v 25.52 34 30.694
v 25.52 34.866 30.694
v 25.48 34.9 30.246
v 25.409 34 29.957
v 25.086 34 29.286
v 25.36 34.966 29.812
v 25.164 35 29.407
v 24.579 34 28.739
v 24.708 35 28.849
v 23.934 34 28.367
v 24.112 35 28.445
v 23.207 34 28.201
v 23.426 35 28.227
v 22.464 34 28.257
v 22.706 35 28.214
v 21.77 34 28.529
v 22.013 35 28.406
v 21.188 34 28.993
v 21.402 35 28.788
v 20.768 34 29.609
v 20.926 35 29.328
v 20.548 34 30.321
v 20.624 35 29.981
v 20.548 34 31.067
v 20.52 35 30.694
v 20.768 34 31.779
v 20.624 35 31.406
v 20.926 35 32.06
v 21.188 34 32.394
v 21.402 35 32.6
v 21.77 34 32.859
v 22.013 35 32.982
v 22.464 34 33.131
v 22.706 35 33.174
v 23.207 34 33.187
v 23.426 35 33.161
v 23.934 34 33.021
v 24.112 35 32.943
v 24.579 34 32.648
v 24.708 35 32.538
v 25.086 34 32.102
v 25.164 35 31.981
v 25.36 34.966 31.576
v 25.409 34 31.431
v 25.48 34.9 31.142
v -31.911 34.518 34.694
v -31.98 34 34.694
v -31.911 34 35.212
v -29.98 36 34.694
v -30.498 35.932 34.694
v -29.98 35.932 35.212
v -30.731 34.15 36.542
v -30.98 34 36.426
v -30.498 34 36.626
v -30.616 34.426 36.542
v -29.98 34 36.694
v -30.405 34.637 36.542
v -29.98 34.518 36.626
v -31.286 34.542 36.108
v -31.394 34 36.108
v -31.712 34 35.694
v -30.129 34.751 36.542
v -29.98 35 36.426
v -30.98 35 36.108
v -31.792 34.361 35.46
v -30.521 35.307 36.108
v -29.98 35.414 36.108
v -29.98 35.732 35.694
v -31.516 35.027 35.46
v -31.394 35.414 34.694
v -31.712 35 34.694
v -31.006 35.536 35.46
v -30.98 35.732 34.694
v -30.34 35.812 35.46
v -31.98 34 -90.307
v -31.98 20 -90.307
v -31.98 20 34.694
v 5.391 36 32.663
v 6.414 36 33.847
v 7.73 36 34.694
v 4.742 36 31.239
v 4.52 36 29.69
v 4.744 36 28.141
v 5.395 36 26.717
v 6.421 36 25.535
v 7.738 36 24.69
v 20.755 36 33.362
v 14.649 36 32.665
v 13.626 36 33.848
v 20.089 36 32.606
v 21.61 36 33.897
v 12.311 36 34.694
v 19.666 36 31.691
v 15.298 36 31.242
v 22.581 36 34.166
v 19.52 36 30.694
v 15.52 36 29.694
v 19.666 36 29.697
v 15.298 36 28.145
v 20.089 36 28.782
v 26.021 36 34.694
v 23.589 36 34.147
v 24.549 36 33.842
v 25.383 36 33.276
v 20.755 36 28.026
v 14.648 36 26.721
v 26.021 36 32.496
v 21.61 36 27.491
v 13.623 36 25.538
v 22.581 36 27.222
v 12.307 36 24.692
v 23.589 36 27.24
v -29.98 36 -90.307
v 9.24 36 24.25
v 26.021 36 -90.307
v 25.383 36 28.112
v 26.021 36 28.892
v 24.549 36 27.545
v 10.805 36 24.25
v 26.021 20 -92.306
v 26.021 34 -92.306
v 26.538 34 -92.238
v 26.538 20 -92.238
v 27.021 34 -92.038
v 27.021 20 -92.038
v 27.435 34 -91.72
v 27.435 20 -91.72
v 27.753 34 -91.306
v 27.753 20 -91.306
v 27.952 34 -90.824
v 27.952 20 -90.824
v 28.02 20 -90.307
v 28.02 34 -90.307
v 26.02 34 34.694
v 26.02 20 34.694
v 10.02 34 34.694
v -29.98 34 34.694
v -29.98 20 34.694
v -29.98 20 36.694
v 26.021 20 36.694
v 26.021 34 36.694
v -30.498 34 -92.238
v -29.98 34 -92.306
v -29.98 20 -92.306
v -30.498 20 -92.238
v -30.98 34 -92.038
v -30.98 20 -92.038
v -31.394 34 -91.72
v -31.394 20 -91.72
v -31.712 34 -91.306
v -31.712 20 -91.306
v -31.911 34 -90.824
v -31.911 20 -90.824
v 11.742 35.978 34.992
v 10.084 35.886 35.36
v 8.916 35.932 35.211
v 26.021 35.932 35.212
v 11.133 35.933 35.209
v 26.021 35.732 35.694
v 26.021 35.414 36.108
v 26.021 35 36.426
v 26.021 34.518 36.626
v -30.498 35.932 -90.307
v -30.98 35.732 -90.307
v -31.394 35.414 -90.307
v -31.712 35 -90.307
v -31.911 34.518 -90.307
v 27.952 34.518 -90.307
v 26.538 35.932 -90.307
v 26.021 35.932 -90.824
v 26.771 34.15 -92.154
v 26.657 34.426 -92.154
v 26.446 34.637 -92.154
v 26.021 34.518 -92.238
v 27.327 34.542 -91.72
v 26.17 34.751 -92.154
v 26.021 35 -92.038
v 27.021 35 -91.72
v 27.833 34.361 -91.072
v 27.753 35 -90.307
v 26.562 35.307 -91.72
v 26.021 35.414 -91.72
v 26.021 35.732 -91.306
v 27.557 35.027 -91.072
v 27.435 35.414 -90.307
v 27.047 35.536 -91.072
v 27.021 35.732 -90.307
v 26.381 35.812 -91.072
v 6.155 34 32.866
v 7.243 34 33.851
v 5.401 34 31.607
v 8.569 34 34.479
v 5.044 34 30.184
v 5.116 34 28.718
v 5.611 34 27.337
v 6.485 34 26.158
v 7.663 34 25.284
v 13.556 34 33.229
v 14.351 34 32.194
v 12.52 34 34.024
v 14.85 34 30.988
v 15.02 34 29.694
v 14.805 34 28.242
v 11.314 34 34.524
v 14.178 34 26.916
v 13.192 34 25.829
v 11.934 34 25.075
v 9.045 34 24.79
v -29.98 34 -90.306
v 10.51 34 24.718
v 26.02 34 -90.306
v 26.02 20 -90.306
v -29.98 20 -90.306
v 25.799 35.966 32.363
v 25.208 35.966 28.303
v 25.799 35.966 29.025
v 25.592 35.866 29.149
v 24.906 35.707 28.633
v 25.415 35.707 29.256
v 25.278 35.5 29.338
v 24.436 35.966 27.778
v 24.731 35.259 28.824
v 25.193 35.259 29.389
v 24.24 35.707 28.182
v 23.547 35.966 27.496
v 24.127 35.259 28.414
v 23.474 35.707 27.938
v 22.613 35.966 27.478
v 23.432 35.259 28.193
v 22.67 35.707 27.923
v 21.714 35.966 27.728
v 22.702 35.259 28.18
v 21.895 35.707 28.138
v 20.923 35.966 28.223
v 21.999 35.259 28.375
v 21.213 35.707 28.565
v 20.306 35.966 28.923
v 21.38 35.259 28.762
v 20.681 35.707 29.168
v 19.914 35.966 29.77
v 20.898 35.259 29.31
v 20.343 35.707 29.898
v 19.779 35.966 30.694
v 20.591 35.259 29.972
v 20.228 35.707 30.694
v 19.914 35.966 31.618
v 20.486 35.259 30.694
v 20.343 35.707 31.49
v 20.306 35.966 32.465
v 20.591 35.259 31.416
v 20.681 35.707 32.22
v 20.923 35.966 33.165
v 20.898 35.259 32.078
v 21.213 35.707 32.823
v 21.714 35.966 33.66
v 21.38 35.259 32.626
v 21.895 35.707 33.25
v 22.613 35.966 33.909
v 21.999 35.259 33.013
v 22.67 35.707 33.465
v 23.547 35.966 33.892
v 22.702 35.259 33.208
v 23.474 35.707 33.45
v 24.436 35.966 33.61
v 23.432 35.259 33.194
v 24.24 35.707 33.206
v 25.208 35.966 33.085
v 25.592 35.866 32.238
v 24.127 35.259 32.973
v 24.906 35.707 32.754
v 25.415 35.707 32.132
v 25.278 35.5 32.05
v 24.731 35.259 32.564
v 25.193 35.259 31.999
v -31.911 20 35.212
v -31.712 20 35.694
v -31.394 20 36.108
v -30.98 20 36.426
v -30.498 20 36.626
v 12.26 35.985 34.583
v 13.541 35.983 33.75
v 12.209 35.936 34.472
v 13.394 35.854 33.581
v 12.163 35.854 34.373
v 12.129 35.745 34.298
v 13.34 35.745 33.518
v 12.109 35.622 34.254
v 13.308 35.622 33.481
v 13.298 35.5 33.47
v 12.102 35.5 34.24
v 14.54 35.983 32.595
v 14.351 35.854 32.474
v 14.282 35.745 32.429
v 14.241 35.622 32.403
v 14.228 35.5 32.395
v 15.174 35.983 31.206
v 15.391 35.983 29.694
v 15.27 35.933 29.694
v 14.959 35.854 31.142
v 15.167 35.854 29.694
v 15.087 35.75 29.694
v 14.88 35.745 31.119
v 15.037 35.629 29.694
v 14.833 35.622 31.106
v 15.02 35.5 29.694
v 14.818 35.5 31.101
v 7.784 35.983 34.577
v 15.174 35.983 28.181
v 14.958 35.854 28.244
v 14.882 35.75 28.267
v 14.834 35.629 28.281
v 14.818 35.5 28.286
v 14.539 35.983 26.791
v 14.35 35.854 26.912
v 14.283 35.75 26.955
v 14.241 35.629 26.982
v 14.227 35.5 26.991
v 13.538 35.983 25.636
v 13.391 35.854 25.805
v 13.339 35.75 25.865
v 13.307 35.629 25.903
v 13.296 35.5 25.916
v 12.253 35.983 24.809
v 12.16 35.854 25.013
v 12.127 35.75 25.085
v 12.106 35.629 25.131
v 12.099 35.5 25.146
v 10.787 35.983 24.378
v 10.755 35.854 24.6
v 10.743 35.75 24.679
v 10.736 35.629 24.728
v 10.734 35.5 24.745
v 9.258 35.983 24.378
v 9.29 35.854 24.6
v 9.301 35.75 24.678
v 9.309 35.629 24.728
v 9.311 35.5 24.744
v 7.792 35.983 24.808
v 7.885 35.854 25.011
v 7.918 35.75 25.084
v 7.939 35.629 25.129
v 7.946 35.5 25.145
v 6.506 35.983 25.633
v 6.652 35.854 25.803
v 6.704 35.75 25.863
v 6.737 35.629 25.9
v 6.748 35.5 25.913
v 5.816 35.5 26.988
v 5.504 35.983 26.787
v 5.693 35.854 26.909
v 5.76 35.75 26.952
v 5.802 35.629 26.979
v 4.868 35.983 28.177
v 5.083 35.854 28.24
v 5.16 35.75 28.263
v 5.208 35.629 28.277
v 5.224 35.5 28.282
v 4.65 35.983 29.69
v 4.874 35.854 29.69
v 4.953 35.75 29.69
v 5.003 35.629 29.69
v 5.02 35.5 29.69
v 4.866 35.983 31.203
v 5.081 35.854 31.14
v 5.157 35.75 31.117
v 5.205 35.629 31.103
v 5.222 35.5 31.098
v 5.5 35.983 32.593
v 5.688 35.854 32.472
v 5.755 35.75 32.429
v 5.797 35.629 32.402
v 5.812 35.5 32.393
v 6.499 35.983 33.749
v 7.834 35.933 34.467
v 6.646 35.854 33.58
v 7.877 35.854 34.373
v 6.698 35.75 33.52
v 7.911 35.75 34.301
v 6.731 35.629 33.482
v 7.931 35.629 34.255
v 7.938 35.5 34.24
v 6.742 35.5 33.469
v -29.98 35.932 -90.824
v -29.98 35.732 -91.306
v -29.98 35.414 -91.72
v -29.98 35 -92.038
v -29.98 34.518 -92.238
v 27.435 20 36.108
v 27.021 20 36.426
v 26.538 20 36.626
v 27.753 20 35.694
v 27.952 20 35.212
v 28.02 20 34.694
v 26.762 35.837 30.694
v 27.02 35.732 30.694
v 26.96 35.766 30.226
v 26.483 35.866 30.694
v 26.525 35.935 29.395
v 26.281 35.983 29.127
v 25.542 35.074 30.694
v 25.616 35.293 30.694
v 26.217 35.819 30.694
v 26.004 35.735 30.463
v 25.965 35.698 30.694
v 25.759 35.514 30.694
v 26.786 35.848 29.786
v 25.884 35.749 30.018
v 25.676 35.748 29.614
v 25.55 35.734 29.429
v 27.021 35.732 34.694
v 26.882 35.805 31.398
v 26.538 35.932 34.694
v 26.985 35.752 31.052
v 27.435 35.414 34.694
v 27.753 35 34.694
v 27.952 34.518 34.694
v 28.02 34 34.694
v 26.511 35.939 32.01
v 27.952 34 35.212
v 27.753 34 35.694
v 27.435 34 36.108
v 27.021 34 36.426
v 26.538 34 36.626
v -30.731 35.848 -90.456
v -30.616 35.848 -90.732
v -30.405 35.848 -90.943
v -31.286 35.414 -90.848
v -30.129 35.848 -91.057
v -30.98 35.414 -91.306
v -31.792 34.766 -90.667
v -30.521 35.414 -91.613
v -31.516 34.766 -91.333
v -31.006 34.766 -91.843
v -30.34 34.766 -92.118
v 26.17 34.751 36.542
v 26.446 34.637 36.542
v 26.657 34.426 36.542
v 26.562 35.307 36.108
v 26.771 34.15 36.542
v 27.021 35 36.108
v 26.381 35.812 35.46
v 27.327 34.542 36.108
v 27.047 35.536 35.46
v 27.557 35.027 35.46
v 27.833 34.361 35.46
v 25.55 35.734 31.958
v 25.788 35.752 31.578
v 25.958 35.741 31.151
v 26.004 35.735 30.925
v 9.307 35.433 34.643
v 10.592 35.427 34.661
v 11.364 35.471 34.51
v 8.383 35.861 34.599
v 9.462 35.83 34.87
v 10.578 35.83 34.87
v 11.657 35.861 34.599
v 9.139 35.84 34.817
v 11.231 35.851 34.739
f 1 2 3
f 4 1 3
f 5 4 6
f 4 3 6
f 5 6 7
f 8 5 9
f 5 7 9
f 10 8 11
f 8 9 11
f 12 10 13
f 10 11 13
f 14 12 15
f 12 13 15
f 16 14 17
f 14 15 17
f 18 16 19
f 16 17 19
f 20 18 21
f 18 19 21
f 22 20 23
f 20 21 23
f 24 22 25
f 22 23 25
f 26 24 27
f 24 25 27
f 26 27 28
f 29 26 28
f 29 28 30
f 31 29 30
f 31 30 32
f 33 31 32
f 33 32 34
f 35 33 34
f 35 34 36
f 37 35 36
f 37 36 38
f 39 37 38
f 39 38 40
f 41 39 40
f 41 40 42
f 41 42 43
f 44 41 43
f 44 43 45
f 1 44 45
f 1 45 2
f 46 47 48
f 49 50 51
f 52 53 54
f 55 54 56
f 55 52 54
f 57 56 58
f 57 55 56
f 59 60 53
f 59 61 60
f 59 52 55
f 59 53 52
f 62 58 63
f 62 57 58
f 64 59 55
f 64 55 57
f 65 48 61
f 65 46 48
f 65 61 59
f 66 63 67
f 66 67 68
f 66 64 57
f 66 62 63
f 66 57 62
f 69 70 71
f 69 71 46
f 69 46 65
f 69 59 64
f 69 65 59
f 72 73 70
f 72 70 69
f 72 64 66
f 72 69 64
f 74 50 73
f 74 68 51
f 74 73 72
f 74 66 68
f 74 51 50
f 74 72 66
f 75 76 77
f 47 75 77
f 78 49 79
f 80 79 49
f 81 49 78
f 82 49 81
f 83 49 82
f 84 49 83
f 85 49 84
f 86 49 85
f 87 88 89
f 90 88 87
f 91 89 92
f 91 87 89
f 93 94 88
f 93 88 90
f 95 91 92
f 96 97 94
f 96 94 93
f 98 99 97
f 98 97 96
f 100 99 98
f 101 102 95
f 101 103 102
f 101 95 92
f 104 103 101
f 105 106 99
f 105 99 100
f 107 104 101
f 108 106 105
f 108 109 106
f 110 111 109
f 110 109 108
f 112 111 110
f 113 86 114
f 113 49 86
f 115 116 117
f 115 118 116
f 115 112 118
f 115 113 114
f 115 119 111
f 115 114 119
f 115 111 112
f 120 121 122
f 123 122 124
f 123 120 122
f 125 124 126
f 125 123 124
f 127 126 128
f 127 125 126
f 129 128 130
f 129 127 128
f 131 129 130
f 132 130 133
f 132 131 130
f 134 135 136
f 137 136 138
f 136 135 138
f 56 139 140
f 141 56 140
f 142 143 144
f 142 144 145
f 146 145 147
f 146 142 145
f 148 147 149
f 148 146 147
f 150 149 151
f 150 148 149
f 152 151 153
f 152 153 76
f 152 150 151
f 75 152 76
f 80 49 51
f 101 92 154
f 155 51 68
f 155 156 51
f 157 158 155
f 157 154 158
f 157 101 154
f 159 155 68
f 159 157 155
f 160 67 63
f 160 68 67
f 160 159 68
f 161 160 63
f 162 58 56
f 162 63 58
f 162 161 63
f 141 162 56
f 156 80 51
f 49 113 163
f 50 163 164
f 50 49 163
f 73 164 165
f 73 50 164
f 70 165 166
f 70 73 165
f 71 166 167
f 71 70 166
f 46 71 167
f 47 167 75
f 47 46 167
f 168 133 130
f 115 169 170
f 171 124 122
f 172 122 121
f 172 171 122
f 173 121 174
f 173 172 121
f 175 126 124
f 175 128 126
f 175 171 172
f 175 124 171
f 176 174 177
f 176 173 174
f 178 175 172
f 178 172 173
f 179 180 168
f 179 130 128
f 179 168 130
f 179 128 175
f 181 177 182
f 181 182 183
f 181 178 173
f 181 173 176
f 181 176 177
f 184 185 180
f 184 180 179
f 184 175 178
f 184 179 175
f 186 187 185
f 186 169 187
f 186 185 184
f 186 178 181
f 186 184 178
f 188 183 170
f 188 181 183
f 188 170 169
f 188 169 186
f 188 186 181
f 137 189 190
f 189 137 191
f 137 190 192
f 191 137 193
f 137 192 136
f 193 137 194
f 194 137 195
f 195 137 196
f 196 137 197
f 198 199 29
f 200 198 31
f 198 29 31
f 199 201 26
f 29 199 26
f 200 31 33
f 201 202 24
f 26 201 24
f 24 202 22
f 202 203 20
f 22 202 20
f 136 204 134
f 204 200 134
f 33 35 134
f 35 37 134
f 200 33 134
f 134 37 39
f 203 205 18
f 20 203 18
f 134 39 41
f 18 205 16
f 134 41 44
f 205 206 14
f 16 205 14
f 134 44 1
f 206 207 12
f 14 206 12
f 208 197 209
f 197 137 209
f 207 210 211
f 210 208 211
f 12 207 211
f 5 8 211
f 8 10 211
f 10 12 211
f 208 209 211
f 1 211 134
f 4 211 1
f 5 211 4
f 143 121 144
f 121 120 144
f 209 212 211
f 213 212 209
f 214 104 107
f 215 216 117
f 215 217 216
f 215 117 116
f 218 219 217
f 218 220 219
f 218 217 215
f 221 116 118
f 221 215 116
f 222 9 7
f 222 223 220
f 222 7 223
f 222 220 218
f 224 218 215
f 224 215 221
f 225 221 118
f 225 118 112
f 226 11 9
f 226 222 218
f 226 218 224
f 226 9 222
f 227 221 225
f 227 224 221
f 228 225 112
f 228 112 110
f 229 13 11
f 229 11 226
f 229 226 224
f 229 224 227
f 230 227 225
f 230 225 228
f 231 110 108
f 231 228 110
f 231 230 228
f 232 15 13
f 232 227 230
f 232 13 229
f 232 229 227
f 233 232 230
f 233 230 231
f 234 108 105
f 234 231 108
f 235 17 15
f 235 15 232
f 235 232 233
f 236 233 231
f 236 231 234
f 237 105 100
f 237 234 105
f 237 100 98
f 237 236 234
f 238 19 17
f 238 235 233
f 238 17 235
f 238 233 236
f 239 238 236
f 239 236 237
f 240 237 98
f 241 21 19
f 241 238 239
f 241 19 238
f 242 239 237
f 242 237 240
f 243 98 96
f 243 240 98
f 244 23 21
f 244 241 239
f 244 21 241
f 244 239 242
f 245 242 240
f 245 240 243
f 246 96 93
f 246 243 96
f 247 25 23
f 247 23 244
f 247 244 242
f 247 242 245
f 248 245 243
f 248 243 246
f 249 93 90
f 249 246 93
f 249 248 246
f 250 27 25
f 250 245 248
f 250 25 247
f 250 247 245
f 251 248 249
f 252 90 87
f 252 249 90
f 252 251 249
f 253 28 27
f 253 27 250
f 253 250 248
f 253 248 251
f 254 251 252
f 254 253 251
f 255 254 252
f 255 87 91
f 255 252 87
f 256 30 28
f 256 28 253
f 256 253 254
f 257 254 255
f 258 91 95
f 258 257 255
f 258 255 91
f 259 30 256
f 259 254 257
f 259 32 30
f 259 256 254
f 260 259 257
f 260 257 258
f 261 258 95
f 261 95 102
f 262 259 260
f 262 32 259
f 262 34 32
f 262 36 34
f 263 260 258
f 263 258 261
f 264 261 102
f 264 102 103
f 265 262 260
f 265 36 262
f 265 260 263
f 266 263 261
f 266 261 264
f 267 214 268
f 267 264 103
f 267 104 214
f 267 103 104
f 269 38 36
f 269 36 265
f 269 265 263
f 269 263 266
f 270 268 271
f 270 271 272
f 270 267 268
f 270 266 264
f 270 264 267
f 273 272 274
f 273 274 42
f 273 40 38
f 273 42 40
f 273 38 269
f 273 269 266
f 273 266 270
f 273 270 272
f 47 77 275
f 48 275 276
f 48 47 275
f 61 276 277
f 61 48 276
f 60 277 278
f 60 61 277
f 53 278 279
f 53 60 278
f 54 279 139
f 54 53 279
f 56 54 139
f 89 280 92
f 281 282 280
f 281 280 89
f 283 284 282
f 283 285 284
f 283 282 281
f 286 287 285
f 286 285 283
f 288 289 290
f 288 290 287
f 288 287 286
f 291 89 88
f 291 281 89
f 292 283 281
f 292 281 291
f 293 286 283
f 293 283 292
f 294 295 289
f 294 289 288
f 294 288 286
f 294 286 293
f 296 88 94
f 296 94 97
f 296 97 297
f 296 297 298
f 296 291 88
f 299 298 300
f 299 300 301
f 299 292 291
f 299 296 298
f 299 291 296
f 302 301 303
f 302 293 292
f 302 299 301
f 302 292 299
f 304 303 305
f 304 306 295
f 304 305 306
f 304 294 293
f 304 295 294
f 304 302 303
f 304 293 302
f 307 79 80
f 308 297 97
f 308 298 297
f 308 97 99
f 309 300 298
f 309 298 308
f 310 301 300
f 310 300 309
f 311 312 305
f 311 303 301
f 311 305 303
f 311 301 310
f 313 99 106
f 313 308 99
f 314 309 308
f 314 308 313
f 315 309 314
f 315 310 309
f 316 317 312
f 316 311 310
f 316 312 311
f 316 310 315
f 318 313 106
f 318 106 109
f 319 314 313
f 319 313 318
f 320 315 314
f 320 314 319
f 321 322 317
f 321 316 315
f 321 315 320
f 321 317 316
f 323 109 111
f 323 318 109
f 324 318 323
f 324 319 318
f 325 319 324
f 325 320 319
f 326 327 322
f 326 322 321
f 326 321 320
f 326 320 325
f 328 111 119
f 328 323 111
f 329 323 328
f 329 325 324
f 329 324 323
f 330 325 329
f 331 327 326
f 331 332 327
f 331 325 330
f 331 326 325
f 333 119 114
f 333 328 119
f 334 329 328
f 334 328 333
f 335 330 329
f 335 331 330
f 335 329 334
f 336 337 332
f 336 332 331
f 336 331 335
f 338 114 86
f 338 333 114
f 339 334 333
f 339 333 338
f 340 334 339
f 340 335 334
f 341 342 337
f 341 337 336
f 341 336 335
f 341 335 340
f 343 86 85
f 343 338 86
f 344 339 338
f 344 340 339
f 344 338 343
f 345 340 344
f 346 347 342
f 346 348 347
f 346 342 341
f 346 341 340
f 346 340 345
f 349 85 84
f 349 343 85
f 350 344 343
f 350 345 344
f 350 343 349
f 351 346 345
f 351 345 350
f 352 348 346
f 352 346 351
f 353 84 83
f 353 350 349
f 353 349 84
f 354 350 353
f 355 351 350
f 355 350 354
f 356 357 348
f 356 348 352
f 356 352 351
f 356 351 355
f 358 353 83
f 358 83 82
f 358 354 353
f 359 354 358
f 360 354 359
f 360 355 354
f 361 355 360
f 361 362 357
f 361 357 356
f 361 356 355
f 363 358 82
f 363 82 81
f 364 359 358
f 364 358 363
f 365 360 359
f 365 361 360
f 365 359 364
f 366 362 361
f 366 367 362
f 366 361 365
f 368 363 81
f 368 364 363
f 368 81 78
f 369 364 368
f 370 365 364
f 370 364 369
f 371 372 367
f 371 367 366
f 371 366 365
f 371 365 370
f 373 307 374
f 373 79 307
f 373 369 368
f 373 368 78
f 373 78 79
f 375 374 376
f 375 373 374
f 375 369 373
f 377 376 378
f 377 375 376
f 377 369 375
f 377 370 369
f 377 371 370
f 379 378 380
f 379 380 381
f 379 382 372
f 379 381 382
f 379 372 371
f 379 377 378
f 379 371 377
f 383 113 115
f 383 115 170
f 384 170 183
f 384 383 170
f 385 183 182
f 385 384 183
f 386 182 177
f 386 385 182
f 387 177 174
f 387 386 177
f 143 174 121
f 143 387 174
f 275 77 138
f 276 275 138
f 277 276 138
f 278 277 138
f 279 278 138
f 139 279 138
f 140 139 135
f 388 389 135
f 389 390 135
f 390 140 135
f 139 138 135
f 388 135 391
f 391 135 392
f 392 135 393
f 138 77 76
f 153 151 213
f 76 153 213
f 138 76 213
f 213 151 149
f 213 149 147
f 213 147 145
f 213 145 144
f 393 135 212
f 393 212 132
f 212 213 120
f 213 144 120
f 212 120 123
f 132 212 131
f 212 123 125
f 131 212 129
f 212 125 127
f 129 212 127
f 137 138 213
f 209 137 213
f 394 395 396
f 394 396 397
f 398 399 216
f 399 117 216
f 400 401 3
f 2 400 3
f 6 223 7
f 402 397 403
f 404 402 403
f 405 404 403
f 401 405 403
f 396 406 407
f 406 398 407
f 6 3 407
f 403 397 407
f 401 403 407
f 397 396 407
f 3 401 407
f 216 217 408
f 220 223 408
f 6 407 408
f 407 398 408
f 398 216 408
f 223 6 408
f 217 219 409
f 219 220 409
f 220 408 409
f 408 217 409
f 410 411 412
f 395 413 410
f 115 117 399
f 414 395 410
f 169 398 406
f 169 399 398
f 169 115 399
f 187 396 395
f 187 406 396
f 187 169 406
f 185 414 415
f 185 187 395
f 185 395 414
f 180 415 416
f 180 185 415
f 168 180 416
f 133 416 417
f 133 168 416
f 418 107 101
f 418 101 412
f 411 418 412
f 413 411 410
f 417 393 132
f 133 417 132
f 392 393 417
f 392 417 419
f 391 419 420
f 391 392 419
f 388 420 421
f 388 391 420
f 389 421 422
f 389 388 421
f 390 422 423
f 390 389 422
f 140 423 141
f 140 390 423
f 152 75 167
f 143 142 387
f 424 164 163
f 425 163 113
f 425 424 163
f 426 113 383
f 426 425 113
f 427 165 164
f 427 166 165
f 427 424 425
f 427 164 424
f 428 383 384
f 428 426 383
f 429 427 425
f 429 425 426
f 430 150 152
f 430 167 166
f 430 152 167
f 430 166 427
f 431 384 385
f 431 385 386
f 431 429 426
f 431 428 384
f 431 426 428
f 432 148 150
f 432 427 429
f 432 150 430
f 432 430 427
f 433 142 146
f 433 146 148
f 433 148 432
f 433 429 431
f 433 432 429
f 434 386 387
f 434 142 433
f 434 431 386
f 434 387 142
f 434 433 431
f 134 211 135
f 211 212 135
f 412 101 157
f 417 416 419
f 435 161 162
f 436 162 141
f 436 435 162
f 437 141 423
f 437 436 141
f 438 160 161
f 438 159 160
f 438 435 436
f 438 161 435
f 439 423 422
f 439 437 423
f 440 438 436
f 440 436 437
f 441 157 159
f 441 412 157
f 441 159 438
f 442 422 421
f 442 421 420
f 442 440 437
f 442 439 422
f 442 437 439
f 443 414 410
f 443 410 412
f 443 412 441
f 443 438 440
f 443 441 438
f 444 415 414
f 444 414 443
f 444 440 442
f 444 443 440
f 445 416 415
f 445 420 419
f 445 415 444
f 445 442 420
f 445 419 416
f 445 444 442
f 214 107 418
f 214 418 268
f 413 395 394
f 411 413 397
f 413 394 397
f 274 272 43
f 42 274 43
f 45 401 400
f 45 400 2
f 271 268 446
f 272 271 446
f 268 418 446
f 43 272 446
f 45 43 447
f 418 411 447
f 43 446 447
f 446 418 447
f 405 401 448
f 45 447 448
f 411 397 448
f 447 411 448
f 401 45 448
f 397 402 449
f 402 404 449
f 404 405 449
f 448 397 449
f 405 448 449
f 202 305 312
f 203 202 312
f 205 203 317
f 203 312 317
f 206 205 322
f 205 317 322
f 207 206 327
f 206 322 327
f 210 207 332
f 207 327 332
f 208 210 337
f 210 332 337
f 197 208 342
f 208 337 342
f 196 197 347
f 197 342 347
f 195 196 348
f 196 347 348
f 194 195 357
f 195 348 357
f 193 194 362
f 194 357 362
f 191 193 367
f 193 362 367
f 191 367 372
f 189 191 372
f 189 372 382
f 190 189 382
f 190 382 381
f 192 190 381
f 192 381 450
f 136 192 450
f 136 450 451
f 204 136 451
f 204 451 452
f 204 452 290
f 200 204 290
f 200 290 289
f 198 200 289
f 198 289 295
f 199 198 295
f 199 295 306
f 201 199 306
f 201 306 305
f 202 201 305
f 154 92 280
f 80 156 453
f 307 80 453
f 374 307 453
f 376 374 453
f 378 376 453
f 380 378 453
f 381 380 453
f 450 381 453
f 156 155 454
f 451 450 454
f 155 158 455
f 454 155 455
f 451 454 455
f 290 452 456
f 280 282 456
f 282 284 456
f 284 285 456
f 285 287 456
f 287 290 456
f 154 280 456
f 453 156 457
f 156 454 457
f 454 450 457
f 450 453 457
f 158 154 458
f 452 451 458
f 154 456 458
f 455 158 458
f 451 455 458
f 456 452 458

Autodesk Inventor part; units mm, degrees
ref_plane "YZ Plane" through (0, 0, 0) normal (1, 0, 0) x (0, 1, 0)
ref_plane "XZ Plane" through (0, 0, 0) normal (0, 1, 0) x (-1, 0, 0)
ref_plane "XY Plane" through (0, 0, 0) normal (0, 0, 1) x (1, 0, 0)
ref_plane "Plan de construction3" through (0, 20, 0) normal (0, 1, 0) x (1, 0, 0)
sketch "Esquisse7" plane through (0, 20, 0) normal (0, 1, 0) x (1, 0, 0)
  line L0 (-31.9796, 92.3061) -> (-31.9796, -36.6939) projected
  line L1 (28.0204, 92.3061) -> (-31.9796, 92.3061) projected
  line L2 (-31.9796, -36.6939) -> (28.0204, -36.6939)
  line L3 (28.0204, -36.6939) -> (28.0204, 92.3061)
  line L4 (28.0204, 92.3061) -> (-31.9796, 92.3061)
  line L5 (-31.9796, 92.3061) -> (-31.9796, -36.6939)
  line L6 (26.0204, 90.3061) -> (-29.9796, 90.3061) projected
  line L7 (26.0204, 90.3061) -> (26.0204, -34.6939) projected
  line L8 (-29.9796, 90.3061) -> (26.0204, 90.3061)
  line L9 (26.0204, 90.3061) -> (26.0204, -34.6939)
  line L10 (26.0204, -34.6939) -> (-29.9796, -34.6939)
  line L11 (-29.9796, -34.6939) -> (-29.9796, 90.3061)
  point P0 (0, 0)
  point P1 (6.0204, 92.3061)
extrude "Extrusion6" add sketch "Esquisse7" along normal blind 14
ref_plane "Plan de construction4" through (0, 34, 0) normal (0, 1, 0) x (1, 0, 0)
sketch "Esquisse8" plane through (0, 34, 0) normal (0, 1, 0) x (1, 0, 0)
  line L0 (-31.9796, 92.3061) -> (-31.9796, -36.6939) projected
  line L1 (28.0204, -36.6939) -> (28.0204, 92.3061) projected
  line L2 (-31.9796, -36.6939) -> (28.0204, -36.6939)
  line L3 (28.0204, -36.6939) -> (28.0204, 92.3061)
  line L4 (28.0204, 92.3061) -> (-31.9796, 92.3061)
  line L5 (-31.9796, 92.3061) -> (-31.9796, -36.6939)
  point P0 (0, 0)
extrude "Extrusion8" add sketch "Esquisse8" along normal blind 2
ref_plane "Plan de construction6" through (0, 36, 0) normal (0, 1, 0) x (1, 0, 0)
sketch "Esquisse9" plane through (0, 36, 0) normal (0, 1, 0) x (1, 0, 0)
  circle A0 centre (10.0204, -29.6939) radius 5
  line L0 (28.0204, -36.6939) -> (28.0204, 92.3061) projected
  line L1 (-31.9796, -36.6939) -> (28.0204, -36.6939) projected
  point P0 (0, 0)
  dimension "d75" = 10
  dimension "d76" = 18
  dimension "d77" = 7
extrude "Extrusion9" cut sketch "Esquisse9" against normal blind 3
ref_plane "Plan de construction5" through (0, 36, 0) normal (0, 1, 0) x (1, 0, 0)
sketch "Esquisse10" plane through (0, 36, 0) normal (0, 1, 0) x (1, 0, 0)
  circle A0 centre (23.0204, -30.6939) radius 2.5
  circle A1 centre (10.0204, -29.6939) radius 5 projected
  line L0 (-31.9796, -36.6939) -> (28.0204, -36.6939) projected
  point P0 (0, 0)
  dimension "d80" = 13
  dimension "d81" = 5
  dimension "d82" = 6
extrude "Extrusion10" cut sketch "Esquisse10" against normal blind 3 contours A0
ref_plane "Plan de construction1" through (0, 18, 0) normal (0, 1, 0) x (1, 0, 0)
ref_plane "Plan de construction2" through (0, 20, 0) normal (0, 1, 0) x (1, 0, 0)
fillet "Congé6" radius 2 8 edges at (28.0204, 36, -27.8061) (28.0204, 28, -92.3061) (28.0204, 28, 36.6939) (-31.9796, 28, -92.3061) (-1.9796, 36, -92.3061) (-31.9796, 36, -27.8061) (-1.9796, 36, 36.6939) (-31.9796, 28, 36.6939)
fillet "Congé7" radius 1 1 edges at (20.5204, 36, 30.6939)
fillet "Congé8" radius 0.5 1 edges at (5.0204, 36, 29.6939)
